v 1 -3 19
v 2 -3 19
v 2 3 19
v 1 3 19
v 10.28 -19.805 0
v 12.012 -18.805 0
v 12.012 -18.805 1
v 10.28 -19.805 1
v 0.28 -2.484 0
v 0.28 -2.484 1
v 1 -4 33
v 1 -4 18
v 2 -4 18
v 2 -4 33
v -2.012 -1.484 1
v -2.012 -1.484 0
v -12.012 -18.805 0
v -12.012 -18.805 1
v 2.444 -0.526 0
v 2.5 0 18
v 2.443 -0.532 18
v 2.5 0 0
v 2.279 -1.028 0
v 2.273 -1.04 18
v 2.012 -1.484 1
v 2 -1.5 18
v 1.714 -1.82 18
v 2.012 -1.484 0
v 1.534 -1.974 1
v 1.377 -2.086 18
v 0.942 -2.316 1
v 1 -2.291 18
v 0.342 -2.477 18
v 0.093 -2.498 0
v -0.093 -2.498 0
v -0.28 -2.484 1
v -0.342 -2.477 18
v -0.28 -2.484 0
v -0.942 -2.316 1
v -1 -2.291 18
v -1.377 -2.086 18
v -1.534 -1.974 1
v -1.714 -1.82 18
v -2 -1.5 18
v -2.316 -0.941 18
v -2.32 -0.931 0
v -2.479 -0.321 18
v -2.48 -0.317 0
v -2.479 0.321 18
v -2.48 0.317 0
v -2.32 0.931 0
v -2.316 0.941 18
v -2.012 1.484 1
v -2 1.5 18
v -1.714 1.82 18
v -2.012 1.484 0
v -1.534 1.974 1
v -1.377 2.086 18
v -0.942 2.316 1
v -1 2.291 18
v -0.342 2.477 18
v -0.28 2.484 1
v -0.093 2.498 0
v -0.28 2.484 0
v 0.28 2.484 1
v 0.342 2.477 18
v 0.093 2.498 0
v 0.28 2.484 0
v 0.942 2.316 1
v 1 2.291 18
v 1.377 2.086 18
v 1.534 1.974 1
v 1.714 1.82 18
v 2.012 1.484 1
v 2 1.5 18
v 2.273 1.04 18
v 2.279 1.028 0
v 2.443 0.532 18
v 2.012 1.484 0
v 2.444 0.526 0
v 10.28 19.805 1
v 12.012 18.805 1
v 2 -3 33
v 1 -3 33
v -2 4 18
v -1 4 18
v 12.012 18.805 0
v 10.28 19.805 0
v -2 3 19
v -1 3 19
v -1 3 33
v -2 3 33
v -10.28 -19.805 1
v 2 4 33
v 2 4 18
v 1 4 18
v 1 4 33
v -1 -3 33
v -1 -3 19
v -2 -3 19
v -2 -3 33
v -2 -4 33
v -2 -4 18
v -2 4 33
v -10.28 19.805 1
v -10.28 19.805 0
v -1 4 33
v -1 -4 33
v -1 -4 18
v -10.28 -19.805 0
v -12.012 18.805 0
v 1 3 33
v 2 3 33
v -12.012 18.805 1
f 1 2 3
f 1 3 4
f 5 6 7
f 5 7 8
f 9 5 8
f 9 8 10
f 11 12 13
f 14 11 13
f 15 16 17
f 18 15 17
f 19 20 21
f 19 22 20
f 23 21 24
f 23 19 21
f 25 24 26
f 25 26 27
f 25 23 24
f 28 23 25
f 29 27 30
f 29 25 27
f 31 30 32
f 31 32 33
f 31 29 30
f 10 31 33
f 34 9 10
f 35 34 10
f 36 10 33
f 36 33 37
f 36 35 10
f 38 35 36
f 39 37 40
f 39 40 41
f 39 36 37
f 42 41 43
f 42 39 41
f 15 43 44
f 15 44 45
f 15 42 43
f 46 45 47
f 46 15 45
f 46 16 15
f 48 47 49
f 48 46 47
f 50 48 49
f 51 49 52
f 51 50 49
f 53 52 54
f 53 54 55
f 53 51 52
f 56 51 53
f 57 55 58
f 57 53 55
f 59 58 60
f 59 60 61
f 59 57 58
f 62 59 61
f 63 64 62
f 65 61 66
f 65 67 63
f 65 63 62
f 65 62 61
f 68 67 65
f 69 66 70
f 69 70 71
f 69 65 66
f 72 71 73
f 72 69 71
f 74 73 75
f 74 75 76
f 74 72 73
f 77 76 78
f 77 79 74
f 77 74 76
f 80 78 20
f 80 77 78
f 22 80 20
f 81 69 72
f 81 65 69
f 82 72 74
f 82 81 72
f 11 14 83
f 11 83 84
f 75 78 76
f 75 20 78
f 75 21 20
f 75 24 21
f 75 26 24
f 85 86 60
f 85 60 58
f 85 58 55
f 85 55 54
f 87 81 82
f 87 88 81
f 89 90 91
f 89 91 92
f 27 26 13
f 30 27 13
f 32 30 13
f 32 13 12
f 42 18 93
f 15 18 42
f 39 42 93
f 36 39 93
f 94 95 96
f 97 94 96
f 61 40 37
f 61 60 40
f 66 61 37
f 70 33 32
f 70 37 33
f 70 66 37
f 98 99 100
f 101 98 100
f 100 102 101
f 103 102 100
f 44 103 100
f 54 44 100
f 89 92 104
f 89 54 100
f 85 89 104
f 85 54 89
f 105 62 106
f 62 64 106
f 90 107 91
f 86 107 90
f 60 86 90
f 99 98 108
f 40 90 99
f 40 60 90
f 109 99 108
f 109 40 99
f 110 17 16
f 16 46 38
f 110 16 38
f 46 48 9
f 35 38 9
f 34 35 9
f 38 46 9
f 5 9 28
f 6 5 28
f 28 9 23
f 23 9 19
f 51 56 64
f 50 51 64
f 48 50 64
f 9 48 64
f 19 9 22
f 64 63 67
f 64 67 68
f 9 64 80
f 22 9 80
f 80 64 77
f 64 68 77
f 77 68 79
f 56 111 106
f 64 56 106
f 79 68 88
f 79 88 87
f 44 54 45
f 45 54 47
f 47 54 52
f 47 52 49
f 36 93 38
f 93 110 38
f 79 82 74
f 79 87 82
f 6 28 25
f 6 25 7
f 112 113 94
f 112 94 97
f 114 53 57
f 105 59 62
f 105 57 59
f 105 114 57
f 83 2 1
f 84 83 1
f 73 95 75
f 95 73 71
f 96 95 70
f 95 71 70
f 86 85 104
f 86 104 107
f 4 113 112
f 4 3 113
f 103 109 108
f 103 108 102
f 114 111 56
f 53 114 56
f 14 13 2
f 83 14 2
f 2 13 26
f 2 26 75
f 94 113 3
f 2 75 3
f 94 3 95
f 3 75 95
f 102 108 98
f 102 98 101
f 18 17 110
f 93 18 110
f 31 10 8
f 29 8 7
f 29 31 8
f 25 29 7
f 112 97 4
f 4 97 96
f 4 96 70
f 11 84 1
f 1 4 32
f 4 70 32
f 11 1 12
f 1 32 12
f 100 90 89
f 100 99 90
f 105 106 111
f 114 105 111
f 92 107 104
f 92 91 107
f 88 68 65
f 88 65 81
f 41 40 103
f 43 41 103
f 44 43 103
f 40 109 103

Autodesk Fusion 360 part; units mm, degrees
sketch "Sketch1" plane through (0, 0, 0) normal (0, 0, 1) x (1, 0, 0)
  circle A0 centre (0, 0) radius 2.5
  line L0 (0.2796, 2.4843) -> (10.2796, 19.8048)
  line L1 (10.2796, 19.8048) -> (12.0117, 18.8048)
  line L2 (12.0117, 18.8048) -> (2.0117, 1.4843)
  line L3 (-0.2796, 2.4843) -> (-10.2796, 19.8048)
  line L4 (-10.2796, 19.8048) -> (-12.0117, 18.8048)
  line L5 (-12.0117, 18.8048) -> (-2.0117, 1.4843)
  line L6 (-2.0117, -1.4843) -> (-12.0117, -18.8048)
  line L7 (-12.0117, -18.8048) -> (-10.2796, -19.8048)
  line L8 (-10.2796, -19.8048) -> (-0.2796, -2.4843)
  line L9 (2.0117, -1.4843) -> (12.0117, -18.8048)
  line L10 (12.0117, -18.8048) -> (10.2796, -19.8048)
  line L11 (10.2796, -19.8048) -> (0.2796, -2.4843)
  line L12 (20, 0) -> (16, 0)
  dimension "d1" = 5
  dimension "d3" = 2
  dimension "d4" = 20
  dimension "d6" = 2
  dimension "d7" = 20
  dimension "d8" = 20
  dimension "d9" = 20
  dimension "d11" = 2
  dimension "d12" = 20
  dimension "d13" = 20
  dimension "d14" = 2
  dimension "d16" = 20
  dimension "d17" = 20
  dimension "d18" = 120
  dimension "d19" = 120
  dimension "d20" = 60
  dimension "d21" = 60
extrude "Extrude1" add sketch "Sketch1" along normal blind 1 contours A0 L0 L1 L2 | A0 L9 L10 L11 | A0 L3 L4 L5 | A0 L6 L7 L8 makes body 1 at (7.8471, 13.5916, 0) makes body 2 at (7.8471, -13.5916, 0) makes body 3 at (-7.8471, 13.5916, 0) makes body 4 at (-7.8471, -13.5916, 0)
extrude "Extrude2" add sketch "Sketch1" along normal blind 18 contours A0 bodies 1 2 3 4
sketch "Sketch2" plane through (0, 0, 18) normal (0, 0, 1) x (-1, 0, 0)
  circle A0 centre (0, 0) radius 2.5
  line L0 (-2, -4) -> (-1, -4)
  line L1 (-1, -4) -> (-1, 4)
  line L2 (-1, 4) -> (-2, 4)
  line L3 (-2, 4) -> (-2, -4)
  line L4 (2, -4) -> (1, -4)
  line L5 (1, -4) -> (1, 4)
  line L6 (1, 4) -> (2, 4)
  line L7 (2, 4) -> (2, -4)
  line L8 (-2, -3) -> (-1, -3)
  line L9 (-2, 3) -> (-1, 3)
  line L10 (1, -3) -> (2, -3)
  line L11 (1, 3) -> (2, 3)
  dimension "d26" = 8
  dimension "d27" = 8
  dimension "d30" = 1
  dimension "d31" = 1
  dimension "d32" = 2
  dimension "d33" = 4
  dimension "d34" = 1
  dimension "d35" = 1
  dimension "d36" = 1
  dimension "d37" = 1
  dimension "d40" = 1
extrude "Extrude3" add sketch "Sketch2" along normal blind 1 contours A0 L5 L7 | A0 L5 L7 L11 | A0 L5 L7 L10 | A0 L1 L3 | A0 L1 L3 L9 | A0 L1 L3 L8 bodies 1
extrude "Extrude4" add sketch "Sketch2" along normal blind 15 contours L5 L6 L7 L11 | L4 L5 L7 L10 | L1 L2 L3 L9 | L0 L1 L3 L8 bodies 1
